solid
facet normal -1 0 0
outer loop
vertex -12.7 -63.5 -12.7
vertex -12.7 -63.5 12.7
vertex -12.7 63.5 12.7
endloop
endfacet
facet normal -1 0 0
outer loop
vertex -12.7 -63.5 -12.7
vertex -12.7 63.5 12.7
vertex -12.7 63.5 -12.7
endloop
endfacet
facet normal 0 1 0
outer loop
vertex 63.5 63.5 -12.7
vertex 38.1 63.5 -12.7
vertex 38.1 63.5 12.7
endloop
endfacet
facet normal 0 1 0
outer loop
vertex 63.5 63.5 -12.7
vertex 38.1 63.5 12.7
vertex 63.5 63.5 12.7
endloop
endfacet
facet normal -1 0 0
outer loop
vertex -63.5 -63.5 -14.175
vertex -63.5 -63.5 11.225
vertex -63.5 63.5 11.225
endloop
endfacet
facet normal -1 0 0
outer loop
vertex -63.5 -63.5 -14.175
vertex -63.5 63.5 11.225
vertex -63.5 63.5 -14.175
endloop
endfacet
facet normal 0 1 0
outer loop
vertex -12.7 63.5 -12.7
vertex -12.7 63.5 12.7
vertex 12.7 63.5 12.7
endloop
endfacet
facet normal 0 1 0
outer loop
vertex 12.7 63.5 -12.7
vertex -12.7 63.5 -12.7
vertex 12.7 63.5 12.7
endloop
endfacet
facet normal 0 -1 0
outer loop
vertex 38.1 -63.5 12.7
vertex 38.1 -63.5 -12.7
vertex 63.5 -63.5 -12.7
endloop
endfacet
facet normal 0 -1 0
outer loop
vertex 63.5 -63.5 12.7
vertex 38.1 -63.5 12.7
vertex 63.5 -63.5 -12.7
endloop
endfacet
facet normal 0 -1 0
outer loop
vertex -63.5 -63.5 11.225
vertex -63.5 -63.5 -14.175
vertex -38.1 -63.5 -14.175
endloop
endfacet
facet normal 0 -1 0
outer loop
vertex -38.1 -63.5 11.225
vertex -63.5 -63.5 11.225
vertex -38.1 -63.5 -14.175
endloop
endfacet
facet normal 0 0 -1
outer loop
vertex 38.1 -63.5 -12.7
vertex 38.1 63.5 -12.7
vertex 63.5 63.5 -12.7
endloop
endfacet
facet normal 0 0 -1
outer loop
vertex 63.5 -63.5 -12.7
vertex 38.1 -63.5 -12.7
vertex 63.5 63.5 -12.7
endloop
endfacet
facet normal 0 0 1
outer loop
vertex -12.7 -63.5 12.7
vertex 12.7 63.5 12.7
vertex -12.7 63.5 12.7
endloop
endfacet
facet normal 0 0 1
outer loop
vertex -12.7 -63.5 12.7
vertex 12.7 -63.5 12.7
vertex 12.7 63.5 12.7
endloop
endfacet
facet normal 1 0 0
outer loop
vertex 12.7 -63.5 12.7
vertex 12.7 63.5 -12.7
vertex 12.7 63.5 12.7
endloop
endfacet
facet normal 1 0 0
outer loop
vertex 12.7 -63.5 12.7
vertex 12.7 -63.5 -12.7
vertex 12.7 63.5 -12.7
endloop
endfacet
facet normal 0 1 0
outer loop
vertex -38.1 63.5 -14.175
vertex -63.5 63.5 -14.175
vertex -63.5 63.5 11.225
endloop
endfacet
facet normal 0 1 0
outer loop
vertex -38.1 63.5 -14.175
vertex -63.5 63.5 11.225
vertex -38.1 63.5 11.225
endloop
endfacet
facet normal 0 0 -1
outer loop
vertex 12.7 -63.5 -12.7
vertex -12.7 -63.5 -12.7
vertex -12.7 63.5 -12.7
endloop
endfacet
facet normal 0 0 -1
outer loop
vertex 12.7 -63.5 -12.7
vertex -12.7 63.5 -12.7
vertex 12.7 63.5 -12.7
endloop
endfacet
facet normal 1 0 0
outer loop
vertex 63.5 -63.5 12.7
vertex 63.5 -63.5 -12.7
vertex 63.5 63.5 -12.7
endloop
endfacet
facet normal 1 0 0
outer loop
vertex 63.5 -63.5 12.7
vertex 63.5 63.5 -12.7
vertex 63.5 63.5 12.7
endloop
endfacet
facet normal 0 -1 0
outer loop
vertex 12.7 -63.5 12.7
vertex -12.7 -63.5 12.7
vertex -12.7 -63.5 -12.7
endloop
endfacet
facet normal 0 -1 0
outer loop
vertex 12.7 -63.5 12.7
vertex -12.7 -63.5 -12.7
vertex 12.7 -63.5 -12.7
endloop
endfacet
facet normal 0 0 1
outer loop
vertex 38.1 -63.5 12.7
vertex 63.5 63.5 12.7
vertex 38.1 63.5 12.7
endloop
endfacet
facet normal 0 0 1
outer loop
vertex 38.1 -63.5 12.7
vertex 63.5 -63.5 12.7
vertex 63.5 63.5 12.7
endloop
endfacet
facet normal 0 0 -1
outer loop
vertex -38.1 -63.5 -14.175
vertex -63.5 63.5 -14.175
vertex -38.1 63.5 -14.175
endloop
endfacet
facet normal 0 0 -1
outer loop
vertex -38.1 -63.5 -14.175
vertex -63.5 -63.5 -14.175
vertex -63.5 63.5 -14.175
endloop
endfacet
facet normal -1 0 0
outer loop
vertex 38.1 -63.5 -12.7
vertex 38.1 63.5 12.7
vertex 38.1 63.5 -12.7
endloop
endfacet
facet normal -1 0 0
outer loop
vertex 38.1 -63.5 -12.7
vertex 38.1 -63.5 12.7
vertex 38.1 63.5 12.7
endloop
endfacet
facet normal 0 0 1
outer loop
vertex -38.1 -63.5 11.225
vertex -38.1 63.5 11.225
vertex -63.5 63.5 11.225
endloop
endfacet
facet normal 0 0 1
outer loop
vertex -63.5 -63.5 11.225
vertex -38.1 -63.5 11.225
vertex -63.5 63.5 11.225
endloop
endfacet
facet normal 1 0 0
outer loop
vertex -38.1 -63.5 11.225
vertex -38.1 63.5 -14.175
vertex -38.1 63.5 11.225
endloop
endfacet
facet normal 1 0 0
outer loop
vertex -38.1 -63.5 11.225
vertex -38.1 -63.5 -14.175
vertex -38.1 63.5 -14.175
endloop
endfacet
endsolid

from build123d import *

# Parameters (mm, degrees)
F1_DEPTH = 63.5
F2_DEPTH = 63.5
F3_DEPTH = 63.5


with BuildPart() as f1:
    # F0 (on Front) → F1 (new body, symmetric)
    with BuildSketch(Plane.XZ):
        Polygon((-38.1, -14.174839), (-38.1, 0), (-38.1, 11.225161), (-63.5, 11.225161), (-63.5, -14.174839), align=None)
    extrude(amount=F1_DEPTH, both=True)


with BuildPart() as f2:
    # F0 (on Front) → F2 (new body, symmetric)
    with BuildSketch(Plane.XZ):
        Polygon((12.7, 0), (12.7, 12.7), (-12.7, 12.7), (-12.7, 0), (0, 0), align=None)
        Polygon((12.7, -12.7), (12.7, 0), (0, 0), (-12.7, 0), (-12.7, -12.7), align=None)
    extrude(amount=F2_DEPTH, both=True)


with BuildPart() as f3:
    # F0 (on Front) → F3 (new body, symmetric)
    with BuildSketch(Plane.XZ):
        Polygon((38.1, 12.7), (38.1, 0), (38.1, -12.7), (63.5, -12.7), (63.5, 12.7), align=None)
    extrude(amount=F3_DEPTH, both=True)


solid = Compound([f1.part, f2.part, f3.part])
